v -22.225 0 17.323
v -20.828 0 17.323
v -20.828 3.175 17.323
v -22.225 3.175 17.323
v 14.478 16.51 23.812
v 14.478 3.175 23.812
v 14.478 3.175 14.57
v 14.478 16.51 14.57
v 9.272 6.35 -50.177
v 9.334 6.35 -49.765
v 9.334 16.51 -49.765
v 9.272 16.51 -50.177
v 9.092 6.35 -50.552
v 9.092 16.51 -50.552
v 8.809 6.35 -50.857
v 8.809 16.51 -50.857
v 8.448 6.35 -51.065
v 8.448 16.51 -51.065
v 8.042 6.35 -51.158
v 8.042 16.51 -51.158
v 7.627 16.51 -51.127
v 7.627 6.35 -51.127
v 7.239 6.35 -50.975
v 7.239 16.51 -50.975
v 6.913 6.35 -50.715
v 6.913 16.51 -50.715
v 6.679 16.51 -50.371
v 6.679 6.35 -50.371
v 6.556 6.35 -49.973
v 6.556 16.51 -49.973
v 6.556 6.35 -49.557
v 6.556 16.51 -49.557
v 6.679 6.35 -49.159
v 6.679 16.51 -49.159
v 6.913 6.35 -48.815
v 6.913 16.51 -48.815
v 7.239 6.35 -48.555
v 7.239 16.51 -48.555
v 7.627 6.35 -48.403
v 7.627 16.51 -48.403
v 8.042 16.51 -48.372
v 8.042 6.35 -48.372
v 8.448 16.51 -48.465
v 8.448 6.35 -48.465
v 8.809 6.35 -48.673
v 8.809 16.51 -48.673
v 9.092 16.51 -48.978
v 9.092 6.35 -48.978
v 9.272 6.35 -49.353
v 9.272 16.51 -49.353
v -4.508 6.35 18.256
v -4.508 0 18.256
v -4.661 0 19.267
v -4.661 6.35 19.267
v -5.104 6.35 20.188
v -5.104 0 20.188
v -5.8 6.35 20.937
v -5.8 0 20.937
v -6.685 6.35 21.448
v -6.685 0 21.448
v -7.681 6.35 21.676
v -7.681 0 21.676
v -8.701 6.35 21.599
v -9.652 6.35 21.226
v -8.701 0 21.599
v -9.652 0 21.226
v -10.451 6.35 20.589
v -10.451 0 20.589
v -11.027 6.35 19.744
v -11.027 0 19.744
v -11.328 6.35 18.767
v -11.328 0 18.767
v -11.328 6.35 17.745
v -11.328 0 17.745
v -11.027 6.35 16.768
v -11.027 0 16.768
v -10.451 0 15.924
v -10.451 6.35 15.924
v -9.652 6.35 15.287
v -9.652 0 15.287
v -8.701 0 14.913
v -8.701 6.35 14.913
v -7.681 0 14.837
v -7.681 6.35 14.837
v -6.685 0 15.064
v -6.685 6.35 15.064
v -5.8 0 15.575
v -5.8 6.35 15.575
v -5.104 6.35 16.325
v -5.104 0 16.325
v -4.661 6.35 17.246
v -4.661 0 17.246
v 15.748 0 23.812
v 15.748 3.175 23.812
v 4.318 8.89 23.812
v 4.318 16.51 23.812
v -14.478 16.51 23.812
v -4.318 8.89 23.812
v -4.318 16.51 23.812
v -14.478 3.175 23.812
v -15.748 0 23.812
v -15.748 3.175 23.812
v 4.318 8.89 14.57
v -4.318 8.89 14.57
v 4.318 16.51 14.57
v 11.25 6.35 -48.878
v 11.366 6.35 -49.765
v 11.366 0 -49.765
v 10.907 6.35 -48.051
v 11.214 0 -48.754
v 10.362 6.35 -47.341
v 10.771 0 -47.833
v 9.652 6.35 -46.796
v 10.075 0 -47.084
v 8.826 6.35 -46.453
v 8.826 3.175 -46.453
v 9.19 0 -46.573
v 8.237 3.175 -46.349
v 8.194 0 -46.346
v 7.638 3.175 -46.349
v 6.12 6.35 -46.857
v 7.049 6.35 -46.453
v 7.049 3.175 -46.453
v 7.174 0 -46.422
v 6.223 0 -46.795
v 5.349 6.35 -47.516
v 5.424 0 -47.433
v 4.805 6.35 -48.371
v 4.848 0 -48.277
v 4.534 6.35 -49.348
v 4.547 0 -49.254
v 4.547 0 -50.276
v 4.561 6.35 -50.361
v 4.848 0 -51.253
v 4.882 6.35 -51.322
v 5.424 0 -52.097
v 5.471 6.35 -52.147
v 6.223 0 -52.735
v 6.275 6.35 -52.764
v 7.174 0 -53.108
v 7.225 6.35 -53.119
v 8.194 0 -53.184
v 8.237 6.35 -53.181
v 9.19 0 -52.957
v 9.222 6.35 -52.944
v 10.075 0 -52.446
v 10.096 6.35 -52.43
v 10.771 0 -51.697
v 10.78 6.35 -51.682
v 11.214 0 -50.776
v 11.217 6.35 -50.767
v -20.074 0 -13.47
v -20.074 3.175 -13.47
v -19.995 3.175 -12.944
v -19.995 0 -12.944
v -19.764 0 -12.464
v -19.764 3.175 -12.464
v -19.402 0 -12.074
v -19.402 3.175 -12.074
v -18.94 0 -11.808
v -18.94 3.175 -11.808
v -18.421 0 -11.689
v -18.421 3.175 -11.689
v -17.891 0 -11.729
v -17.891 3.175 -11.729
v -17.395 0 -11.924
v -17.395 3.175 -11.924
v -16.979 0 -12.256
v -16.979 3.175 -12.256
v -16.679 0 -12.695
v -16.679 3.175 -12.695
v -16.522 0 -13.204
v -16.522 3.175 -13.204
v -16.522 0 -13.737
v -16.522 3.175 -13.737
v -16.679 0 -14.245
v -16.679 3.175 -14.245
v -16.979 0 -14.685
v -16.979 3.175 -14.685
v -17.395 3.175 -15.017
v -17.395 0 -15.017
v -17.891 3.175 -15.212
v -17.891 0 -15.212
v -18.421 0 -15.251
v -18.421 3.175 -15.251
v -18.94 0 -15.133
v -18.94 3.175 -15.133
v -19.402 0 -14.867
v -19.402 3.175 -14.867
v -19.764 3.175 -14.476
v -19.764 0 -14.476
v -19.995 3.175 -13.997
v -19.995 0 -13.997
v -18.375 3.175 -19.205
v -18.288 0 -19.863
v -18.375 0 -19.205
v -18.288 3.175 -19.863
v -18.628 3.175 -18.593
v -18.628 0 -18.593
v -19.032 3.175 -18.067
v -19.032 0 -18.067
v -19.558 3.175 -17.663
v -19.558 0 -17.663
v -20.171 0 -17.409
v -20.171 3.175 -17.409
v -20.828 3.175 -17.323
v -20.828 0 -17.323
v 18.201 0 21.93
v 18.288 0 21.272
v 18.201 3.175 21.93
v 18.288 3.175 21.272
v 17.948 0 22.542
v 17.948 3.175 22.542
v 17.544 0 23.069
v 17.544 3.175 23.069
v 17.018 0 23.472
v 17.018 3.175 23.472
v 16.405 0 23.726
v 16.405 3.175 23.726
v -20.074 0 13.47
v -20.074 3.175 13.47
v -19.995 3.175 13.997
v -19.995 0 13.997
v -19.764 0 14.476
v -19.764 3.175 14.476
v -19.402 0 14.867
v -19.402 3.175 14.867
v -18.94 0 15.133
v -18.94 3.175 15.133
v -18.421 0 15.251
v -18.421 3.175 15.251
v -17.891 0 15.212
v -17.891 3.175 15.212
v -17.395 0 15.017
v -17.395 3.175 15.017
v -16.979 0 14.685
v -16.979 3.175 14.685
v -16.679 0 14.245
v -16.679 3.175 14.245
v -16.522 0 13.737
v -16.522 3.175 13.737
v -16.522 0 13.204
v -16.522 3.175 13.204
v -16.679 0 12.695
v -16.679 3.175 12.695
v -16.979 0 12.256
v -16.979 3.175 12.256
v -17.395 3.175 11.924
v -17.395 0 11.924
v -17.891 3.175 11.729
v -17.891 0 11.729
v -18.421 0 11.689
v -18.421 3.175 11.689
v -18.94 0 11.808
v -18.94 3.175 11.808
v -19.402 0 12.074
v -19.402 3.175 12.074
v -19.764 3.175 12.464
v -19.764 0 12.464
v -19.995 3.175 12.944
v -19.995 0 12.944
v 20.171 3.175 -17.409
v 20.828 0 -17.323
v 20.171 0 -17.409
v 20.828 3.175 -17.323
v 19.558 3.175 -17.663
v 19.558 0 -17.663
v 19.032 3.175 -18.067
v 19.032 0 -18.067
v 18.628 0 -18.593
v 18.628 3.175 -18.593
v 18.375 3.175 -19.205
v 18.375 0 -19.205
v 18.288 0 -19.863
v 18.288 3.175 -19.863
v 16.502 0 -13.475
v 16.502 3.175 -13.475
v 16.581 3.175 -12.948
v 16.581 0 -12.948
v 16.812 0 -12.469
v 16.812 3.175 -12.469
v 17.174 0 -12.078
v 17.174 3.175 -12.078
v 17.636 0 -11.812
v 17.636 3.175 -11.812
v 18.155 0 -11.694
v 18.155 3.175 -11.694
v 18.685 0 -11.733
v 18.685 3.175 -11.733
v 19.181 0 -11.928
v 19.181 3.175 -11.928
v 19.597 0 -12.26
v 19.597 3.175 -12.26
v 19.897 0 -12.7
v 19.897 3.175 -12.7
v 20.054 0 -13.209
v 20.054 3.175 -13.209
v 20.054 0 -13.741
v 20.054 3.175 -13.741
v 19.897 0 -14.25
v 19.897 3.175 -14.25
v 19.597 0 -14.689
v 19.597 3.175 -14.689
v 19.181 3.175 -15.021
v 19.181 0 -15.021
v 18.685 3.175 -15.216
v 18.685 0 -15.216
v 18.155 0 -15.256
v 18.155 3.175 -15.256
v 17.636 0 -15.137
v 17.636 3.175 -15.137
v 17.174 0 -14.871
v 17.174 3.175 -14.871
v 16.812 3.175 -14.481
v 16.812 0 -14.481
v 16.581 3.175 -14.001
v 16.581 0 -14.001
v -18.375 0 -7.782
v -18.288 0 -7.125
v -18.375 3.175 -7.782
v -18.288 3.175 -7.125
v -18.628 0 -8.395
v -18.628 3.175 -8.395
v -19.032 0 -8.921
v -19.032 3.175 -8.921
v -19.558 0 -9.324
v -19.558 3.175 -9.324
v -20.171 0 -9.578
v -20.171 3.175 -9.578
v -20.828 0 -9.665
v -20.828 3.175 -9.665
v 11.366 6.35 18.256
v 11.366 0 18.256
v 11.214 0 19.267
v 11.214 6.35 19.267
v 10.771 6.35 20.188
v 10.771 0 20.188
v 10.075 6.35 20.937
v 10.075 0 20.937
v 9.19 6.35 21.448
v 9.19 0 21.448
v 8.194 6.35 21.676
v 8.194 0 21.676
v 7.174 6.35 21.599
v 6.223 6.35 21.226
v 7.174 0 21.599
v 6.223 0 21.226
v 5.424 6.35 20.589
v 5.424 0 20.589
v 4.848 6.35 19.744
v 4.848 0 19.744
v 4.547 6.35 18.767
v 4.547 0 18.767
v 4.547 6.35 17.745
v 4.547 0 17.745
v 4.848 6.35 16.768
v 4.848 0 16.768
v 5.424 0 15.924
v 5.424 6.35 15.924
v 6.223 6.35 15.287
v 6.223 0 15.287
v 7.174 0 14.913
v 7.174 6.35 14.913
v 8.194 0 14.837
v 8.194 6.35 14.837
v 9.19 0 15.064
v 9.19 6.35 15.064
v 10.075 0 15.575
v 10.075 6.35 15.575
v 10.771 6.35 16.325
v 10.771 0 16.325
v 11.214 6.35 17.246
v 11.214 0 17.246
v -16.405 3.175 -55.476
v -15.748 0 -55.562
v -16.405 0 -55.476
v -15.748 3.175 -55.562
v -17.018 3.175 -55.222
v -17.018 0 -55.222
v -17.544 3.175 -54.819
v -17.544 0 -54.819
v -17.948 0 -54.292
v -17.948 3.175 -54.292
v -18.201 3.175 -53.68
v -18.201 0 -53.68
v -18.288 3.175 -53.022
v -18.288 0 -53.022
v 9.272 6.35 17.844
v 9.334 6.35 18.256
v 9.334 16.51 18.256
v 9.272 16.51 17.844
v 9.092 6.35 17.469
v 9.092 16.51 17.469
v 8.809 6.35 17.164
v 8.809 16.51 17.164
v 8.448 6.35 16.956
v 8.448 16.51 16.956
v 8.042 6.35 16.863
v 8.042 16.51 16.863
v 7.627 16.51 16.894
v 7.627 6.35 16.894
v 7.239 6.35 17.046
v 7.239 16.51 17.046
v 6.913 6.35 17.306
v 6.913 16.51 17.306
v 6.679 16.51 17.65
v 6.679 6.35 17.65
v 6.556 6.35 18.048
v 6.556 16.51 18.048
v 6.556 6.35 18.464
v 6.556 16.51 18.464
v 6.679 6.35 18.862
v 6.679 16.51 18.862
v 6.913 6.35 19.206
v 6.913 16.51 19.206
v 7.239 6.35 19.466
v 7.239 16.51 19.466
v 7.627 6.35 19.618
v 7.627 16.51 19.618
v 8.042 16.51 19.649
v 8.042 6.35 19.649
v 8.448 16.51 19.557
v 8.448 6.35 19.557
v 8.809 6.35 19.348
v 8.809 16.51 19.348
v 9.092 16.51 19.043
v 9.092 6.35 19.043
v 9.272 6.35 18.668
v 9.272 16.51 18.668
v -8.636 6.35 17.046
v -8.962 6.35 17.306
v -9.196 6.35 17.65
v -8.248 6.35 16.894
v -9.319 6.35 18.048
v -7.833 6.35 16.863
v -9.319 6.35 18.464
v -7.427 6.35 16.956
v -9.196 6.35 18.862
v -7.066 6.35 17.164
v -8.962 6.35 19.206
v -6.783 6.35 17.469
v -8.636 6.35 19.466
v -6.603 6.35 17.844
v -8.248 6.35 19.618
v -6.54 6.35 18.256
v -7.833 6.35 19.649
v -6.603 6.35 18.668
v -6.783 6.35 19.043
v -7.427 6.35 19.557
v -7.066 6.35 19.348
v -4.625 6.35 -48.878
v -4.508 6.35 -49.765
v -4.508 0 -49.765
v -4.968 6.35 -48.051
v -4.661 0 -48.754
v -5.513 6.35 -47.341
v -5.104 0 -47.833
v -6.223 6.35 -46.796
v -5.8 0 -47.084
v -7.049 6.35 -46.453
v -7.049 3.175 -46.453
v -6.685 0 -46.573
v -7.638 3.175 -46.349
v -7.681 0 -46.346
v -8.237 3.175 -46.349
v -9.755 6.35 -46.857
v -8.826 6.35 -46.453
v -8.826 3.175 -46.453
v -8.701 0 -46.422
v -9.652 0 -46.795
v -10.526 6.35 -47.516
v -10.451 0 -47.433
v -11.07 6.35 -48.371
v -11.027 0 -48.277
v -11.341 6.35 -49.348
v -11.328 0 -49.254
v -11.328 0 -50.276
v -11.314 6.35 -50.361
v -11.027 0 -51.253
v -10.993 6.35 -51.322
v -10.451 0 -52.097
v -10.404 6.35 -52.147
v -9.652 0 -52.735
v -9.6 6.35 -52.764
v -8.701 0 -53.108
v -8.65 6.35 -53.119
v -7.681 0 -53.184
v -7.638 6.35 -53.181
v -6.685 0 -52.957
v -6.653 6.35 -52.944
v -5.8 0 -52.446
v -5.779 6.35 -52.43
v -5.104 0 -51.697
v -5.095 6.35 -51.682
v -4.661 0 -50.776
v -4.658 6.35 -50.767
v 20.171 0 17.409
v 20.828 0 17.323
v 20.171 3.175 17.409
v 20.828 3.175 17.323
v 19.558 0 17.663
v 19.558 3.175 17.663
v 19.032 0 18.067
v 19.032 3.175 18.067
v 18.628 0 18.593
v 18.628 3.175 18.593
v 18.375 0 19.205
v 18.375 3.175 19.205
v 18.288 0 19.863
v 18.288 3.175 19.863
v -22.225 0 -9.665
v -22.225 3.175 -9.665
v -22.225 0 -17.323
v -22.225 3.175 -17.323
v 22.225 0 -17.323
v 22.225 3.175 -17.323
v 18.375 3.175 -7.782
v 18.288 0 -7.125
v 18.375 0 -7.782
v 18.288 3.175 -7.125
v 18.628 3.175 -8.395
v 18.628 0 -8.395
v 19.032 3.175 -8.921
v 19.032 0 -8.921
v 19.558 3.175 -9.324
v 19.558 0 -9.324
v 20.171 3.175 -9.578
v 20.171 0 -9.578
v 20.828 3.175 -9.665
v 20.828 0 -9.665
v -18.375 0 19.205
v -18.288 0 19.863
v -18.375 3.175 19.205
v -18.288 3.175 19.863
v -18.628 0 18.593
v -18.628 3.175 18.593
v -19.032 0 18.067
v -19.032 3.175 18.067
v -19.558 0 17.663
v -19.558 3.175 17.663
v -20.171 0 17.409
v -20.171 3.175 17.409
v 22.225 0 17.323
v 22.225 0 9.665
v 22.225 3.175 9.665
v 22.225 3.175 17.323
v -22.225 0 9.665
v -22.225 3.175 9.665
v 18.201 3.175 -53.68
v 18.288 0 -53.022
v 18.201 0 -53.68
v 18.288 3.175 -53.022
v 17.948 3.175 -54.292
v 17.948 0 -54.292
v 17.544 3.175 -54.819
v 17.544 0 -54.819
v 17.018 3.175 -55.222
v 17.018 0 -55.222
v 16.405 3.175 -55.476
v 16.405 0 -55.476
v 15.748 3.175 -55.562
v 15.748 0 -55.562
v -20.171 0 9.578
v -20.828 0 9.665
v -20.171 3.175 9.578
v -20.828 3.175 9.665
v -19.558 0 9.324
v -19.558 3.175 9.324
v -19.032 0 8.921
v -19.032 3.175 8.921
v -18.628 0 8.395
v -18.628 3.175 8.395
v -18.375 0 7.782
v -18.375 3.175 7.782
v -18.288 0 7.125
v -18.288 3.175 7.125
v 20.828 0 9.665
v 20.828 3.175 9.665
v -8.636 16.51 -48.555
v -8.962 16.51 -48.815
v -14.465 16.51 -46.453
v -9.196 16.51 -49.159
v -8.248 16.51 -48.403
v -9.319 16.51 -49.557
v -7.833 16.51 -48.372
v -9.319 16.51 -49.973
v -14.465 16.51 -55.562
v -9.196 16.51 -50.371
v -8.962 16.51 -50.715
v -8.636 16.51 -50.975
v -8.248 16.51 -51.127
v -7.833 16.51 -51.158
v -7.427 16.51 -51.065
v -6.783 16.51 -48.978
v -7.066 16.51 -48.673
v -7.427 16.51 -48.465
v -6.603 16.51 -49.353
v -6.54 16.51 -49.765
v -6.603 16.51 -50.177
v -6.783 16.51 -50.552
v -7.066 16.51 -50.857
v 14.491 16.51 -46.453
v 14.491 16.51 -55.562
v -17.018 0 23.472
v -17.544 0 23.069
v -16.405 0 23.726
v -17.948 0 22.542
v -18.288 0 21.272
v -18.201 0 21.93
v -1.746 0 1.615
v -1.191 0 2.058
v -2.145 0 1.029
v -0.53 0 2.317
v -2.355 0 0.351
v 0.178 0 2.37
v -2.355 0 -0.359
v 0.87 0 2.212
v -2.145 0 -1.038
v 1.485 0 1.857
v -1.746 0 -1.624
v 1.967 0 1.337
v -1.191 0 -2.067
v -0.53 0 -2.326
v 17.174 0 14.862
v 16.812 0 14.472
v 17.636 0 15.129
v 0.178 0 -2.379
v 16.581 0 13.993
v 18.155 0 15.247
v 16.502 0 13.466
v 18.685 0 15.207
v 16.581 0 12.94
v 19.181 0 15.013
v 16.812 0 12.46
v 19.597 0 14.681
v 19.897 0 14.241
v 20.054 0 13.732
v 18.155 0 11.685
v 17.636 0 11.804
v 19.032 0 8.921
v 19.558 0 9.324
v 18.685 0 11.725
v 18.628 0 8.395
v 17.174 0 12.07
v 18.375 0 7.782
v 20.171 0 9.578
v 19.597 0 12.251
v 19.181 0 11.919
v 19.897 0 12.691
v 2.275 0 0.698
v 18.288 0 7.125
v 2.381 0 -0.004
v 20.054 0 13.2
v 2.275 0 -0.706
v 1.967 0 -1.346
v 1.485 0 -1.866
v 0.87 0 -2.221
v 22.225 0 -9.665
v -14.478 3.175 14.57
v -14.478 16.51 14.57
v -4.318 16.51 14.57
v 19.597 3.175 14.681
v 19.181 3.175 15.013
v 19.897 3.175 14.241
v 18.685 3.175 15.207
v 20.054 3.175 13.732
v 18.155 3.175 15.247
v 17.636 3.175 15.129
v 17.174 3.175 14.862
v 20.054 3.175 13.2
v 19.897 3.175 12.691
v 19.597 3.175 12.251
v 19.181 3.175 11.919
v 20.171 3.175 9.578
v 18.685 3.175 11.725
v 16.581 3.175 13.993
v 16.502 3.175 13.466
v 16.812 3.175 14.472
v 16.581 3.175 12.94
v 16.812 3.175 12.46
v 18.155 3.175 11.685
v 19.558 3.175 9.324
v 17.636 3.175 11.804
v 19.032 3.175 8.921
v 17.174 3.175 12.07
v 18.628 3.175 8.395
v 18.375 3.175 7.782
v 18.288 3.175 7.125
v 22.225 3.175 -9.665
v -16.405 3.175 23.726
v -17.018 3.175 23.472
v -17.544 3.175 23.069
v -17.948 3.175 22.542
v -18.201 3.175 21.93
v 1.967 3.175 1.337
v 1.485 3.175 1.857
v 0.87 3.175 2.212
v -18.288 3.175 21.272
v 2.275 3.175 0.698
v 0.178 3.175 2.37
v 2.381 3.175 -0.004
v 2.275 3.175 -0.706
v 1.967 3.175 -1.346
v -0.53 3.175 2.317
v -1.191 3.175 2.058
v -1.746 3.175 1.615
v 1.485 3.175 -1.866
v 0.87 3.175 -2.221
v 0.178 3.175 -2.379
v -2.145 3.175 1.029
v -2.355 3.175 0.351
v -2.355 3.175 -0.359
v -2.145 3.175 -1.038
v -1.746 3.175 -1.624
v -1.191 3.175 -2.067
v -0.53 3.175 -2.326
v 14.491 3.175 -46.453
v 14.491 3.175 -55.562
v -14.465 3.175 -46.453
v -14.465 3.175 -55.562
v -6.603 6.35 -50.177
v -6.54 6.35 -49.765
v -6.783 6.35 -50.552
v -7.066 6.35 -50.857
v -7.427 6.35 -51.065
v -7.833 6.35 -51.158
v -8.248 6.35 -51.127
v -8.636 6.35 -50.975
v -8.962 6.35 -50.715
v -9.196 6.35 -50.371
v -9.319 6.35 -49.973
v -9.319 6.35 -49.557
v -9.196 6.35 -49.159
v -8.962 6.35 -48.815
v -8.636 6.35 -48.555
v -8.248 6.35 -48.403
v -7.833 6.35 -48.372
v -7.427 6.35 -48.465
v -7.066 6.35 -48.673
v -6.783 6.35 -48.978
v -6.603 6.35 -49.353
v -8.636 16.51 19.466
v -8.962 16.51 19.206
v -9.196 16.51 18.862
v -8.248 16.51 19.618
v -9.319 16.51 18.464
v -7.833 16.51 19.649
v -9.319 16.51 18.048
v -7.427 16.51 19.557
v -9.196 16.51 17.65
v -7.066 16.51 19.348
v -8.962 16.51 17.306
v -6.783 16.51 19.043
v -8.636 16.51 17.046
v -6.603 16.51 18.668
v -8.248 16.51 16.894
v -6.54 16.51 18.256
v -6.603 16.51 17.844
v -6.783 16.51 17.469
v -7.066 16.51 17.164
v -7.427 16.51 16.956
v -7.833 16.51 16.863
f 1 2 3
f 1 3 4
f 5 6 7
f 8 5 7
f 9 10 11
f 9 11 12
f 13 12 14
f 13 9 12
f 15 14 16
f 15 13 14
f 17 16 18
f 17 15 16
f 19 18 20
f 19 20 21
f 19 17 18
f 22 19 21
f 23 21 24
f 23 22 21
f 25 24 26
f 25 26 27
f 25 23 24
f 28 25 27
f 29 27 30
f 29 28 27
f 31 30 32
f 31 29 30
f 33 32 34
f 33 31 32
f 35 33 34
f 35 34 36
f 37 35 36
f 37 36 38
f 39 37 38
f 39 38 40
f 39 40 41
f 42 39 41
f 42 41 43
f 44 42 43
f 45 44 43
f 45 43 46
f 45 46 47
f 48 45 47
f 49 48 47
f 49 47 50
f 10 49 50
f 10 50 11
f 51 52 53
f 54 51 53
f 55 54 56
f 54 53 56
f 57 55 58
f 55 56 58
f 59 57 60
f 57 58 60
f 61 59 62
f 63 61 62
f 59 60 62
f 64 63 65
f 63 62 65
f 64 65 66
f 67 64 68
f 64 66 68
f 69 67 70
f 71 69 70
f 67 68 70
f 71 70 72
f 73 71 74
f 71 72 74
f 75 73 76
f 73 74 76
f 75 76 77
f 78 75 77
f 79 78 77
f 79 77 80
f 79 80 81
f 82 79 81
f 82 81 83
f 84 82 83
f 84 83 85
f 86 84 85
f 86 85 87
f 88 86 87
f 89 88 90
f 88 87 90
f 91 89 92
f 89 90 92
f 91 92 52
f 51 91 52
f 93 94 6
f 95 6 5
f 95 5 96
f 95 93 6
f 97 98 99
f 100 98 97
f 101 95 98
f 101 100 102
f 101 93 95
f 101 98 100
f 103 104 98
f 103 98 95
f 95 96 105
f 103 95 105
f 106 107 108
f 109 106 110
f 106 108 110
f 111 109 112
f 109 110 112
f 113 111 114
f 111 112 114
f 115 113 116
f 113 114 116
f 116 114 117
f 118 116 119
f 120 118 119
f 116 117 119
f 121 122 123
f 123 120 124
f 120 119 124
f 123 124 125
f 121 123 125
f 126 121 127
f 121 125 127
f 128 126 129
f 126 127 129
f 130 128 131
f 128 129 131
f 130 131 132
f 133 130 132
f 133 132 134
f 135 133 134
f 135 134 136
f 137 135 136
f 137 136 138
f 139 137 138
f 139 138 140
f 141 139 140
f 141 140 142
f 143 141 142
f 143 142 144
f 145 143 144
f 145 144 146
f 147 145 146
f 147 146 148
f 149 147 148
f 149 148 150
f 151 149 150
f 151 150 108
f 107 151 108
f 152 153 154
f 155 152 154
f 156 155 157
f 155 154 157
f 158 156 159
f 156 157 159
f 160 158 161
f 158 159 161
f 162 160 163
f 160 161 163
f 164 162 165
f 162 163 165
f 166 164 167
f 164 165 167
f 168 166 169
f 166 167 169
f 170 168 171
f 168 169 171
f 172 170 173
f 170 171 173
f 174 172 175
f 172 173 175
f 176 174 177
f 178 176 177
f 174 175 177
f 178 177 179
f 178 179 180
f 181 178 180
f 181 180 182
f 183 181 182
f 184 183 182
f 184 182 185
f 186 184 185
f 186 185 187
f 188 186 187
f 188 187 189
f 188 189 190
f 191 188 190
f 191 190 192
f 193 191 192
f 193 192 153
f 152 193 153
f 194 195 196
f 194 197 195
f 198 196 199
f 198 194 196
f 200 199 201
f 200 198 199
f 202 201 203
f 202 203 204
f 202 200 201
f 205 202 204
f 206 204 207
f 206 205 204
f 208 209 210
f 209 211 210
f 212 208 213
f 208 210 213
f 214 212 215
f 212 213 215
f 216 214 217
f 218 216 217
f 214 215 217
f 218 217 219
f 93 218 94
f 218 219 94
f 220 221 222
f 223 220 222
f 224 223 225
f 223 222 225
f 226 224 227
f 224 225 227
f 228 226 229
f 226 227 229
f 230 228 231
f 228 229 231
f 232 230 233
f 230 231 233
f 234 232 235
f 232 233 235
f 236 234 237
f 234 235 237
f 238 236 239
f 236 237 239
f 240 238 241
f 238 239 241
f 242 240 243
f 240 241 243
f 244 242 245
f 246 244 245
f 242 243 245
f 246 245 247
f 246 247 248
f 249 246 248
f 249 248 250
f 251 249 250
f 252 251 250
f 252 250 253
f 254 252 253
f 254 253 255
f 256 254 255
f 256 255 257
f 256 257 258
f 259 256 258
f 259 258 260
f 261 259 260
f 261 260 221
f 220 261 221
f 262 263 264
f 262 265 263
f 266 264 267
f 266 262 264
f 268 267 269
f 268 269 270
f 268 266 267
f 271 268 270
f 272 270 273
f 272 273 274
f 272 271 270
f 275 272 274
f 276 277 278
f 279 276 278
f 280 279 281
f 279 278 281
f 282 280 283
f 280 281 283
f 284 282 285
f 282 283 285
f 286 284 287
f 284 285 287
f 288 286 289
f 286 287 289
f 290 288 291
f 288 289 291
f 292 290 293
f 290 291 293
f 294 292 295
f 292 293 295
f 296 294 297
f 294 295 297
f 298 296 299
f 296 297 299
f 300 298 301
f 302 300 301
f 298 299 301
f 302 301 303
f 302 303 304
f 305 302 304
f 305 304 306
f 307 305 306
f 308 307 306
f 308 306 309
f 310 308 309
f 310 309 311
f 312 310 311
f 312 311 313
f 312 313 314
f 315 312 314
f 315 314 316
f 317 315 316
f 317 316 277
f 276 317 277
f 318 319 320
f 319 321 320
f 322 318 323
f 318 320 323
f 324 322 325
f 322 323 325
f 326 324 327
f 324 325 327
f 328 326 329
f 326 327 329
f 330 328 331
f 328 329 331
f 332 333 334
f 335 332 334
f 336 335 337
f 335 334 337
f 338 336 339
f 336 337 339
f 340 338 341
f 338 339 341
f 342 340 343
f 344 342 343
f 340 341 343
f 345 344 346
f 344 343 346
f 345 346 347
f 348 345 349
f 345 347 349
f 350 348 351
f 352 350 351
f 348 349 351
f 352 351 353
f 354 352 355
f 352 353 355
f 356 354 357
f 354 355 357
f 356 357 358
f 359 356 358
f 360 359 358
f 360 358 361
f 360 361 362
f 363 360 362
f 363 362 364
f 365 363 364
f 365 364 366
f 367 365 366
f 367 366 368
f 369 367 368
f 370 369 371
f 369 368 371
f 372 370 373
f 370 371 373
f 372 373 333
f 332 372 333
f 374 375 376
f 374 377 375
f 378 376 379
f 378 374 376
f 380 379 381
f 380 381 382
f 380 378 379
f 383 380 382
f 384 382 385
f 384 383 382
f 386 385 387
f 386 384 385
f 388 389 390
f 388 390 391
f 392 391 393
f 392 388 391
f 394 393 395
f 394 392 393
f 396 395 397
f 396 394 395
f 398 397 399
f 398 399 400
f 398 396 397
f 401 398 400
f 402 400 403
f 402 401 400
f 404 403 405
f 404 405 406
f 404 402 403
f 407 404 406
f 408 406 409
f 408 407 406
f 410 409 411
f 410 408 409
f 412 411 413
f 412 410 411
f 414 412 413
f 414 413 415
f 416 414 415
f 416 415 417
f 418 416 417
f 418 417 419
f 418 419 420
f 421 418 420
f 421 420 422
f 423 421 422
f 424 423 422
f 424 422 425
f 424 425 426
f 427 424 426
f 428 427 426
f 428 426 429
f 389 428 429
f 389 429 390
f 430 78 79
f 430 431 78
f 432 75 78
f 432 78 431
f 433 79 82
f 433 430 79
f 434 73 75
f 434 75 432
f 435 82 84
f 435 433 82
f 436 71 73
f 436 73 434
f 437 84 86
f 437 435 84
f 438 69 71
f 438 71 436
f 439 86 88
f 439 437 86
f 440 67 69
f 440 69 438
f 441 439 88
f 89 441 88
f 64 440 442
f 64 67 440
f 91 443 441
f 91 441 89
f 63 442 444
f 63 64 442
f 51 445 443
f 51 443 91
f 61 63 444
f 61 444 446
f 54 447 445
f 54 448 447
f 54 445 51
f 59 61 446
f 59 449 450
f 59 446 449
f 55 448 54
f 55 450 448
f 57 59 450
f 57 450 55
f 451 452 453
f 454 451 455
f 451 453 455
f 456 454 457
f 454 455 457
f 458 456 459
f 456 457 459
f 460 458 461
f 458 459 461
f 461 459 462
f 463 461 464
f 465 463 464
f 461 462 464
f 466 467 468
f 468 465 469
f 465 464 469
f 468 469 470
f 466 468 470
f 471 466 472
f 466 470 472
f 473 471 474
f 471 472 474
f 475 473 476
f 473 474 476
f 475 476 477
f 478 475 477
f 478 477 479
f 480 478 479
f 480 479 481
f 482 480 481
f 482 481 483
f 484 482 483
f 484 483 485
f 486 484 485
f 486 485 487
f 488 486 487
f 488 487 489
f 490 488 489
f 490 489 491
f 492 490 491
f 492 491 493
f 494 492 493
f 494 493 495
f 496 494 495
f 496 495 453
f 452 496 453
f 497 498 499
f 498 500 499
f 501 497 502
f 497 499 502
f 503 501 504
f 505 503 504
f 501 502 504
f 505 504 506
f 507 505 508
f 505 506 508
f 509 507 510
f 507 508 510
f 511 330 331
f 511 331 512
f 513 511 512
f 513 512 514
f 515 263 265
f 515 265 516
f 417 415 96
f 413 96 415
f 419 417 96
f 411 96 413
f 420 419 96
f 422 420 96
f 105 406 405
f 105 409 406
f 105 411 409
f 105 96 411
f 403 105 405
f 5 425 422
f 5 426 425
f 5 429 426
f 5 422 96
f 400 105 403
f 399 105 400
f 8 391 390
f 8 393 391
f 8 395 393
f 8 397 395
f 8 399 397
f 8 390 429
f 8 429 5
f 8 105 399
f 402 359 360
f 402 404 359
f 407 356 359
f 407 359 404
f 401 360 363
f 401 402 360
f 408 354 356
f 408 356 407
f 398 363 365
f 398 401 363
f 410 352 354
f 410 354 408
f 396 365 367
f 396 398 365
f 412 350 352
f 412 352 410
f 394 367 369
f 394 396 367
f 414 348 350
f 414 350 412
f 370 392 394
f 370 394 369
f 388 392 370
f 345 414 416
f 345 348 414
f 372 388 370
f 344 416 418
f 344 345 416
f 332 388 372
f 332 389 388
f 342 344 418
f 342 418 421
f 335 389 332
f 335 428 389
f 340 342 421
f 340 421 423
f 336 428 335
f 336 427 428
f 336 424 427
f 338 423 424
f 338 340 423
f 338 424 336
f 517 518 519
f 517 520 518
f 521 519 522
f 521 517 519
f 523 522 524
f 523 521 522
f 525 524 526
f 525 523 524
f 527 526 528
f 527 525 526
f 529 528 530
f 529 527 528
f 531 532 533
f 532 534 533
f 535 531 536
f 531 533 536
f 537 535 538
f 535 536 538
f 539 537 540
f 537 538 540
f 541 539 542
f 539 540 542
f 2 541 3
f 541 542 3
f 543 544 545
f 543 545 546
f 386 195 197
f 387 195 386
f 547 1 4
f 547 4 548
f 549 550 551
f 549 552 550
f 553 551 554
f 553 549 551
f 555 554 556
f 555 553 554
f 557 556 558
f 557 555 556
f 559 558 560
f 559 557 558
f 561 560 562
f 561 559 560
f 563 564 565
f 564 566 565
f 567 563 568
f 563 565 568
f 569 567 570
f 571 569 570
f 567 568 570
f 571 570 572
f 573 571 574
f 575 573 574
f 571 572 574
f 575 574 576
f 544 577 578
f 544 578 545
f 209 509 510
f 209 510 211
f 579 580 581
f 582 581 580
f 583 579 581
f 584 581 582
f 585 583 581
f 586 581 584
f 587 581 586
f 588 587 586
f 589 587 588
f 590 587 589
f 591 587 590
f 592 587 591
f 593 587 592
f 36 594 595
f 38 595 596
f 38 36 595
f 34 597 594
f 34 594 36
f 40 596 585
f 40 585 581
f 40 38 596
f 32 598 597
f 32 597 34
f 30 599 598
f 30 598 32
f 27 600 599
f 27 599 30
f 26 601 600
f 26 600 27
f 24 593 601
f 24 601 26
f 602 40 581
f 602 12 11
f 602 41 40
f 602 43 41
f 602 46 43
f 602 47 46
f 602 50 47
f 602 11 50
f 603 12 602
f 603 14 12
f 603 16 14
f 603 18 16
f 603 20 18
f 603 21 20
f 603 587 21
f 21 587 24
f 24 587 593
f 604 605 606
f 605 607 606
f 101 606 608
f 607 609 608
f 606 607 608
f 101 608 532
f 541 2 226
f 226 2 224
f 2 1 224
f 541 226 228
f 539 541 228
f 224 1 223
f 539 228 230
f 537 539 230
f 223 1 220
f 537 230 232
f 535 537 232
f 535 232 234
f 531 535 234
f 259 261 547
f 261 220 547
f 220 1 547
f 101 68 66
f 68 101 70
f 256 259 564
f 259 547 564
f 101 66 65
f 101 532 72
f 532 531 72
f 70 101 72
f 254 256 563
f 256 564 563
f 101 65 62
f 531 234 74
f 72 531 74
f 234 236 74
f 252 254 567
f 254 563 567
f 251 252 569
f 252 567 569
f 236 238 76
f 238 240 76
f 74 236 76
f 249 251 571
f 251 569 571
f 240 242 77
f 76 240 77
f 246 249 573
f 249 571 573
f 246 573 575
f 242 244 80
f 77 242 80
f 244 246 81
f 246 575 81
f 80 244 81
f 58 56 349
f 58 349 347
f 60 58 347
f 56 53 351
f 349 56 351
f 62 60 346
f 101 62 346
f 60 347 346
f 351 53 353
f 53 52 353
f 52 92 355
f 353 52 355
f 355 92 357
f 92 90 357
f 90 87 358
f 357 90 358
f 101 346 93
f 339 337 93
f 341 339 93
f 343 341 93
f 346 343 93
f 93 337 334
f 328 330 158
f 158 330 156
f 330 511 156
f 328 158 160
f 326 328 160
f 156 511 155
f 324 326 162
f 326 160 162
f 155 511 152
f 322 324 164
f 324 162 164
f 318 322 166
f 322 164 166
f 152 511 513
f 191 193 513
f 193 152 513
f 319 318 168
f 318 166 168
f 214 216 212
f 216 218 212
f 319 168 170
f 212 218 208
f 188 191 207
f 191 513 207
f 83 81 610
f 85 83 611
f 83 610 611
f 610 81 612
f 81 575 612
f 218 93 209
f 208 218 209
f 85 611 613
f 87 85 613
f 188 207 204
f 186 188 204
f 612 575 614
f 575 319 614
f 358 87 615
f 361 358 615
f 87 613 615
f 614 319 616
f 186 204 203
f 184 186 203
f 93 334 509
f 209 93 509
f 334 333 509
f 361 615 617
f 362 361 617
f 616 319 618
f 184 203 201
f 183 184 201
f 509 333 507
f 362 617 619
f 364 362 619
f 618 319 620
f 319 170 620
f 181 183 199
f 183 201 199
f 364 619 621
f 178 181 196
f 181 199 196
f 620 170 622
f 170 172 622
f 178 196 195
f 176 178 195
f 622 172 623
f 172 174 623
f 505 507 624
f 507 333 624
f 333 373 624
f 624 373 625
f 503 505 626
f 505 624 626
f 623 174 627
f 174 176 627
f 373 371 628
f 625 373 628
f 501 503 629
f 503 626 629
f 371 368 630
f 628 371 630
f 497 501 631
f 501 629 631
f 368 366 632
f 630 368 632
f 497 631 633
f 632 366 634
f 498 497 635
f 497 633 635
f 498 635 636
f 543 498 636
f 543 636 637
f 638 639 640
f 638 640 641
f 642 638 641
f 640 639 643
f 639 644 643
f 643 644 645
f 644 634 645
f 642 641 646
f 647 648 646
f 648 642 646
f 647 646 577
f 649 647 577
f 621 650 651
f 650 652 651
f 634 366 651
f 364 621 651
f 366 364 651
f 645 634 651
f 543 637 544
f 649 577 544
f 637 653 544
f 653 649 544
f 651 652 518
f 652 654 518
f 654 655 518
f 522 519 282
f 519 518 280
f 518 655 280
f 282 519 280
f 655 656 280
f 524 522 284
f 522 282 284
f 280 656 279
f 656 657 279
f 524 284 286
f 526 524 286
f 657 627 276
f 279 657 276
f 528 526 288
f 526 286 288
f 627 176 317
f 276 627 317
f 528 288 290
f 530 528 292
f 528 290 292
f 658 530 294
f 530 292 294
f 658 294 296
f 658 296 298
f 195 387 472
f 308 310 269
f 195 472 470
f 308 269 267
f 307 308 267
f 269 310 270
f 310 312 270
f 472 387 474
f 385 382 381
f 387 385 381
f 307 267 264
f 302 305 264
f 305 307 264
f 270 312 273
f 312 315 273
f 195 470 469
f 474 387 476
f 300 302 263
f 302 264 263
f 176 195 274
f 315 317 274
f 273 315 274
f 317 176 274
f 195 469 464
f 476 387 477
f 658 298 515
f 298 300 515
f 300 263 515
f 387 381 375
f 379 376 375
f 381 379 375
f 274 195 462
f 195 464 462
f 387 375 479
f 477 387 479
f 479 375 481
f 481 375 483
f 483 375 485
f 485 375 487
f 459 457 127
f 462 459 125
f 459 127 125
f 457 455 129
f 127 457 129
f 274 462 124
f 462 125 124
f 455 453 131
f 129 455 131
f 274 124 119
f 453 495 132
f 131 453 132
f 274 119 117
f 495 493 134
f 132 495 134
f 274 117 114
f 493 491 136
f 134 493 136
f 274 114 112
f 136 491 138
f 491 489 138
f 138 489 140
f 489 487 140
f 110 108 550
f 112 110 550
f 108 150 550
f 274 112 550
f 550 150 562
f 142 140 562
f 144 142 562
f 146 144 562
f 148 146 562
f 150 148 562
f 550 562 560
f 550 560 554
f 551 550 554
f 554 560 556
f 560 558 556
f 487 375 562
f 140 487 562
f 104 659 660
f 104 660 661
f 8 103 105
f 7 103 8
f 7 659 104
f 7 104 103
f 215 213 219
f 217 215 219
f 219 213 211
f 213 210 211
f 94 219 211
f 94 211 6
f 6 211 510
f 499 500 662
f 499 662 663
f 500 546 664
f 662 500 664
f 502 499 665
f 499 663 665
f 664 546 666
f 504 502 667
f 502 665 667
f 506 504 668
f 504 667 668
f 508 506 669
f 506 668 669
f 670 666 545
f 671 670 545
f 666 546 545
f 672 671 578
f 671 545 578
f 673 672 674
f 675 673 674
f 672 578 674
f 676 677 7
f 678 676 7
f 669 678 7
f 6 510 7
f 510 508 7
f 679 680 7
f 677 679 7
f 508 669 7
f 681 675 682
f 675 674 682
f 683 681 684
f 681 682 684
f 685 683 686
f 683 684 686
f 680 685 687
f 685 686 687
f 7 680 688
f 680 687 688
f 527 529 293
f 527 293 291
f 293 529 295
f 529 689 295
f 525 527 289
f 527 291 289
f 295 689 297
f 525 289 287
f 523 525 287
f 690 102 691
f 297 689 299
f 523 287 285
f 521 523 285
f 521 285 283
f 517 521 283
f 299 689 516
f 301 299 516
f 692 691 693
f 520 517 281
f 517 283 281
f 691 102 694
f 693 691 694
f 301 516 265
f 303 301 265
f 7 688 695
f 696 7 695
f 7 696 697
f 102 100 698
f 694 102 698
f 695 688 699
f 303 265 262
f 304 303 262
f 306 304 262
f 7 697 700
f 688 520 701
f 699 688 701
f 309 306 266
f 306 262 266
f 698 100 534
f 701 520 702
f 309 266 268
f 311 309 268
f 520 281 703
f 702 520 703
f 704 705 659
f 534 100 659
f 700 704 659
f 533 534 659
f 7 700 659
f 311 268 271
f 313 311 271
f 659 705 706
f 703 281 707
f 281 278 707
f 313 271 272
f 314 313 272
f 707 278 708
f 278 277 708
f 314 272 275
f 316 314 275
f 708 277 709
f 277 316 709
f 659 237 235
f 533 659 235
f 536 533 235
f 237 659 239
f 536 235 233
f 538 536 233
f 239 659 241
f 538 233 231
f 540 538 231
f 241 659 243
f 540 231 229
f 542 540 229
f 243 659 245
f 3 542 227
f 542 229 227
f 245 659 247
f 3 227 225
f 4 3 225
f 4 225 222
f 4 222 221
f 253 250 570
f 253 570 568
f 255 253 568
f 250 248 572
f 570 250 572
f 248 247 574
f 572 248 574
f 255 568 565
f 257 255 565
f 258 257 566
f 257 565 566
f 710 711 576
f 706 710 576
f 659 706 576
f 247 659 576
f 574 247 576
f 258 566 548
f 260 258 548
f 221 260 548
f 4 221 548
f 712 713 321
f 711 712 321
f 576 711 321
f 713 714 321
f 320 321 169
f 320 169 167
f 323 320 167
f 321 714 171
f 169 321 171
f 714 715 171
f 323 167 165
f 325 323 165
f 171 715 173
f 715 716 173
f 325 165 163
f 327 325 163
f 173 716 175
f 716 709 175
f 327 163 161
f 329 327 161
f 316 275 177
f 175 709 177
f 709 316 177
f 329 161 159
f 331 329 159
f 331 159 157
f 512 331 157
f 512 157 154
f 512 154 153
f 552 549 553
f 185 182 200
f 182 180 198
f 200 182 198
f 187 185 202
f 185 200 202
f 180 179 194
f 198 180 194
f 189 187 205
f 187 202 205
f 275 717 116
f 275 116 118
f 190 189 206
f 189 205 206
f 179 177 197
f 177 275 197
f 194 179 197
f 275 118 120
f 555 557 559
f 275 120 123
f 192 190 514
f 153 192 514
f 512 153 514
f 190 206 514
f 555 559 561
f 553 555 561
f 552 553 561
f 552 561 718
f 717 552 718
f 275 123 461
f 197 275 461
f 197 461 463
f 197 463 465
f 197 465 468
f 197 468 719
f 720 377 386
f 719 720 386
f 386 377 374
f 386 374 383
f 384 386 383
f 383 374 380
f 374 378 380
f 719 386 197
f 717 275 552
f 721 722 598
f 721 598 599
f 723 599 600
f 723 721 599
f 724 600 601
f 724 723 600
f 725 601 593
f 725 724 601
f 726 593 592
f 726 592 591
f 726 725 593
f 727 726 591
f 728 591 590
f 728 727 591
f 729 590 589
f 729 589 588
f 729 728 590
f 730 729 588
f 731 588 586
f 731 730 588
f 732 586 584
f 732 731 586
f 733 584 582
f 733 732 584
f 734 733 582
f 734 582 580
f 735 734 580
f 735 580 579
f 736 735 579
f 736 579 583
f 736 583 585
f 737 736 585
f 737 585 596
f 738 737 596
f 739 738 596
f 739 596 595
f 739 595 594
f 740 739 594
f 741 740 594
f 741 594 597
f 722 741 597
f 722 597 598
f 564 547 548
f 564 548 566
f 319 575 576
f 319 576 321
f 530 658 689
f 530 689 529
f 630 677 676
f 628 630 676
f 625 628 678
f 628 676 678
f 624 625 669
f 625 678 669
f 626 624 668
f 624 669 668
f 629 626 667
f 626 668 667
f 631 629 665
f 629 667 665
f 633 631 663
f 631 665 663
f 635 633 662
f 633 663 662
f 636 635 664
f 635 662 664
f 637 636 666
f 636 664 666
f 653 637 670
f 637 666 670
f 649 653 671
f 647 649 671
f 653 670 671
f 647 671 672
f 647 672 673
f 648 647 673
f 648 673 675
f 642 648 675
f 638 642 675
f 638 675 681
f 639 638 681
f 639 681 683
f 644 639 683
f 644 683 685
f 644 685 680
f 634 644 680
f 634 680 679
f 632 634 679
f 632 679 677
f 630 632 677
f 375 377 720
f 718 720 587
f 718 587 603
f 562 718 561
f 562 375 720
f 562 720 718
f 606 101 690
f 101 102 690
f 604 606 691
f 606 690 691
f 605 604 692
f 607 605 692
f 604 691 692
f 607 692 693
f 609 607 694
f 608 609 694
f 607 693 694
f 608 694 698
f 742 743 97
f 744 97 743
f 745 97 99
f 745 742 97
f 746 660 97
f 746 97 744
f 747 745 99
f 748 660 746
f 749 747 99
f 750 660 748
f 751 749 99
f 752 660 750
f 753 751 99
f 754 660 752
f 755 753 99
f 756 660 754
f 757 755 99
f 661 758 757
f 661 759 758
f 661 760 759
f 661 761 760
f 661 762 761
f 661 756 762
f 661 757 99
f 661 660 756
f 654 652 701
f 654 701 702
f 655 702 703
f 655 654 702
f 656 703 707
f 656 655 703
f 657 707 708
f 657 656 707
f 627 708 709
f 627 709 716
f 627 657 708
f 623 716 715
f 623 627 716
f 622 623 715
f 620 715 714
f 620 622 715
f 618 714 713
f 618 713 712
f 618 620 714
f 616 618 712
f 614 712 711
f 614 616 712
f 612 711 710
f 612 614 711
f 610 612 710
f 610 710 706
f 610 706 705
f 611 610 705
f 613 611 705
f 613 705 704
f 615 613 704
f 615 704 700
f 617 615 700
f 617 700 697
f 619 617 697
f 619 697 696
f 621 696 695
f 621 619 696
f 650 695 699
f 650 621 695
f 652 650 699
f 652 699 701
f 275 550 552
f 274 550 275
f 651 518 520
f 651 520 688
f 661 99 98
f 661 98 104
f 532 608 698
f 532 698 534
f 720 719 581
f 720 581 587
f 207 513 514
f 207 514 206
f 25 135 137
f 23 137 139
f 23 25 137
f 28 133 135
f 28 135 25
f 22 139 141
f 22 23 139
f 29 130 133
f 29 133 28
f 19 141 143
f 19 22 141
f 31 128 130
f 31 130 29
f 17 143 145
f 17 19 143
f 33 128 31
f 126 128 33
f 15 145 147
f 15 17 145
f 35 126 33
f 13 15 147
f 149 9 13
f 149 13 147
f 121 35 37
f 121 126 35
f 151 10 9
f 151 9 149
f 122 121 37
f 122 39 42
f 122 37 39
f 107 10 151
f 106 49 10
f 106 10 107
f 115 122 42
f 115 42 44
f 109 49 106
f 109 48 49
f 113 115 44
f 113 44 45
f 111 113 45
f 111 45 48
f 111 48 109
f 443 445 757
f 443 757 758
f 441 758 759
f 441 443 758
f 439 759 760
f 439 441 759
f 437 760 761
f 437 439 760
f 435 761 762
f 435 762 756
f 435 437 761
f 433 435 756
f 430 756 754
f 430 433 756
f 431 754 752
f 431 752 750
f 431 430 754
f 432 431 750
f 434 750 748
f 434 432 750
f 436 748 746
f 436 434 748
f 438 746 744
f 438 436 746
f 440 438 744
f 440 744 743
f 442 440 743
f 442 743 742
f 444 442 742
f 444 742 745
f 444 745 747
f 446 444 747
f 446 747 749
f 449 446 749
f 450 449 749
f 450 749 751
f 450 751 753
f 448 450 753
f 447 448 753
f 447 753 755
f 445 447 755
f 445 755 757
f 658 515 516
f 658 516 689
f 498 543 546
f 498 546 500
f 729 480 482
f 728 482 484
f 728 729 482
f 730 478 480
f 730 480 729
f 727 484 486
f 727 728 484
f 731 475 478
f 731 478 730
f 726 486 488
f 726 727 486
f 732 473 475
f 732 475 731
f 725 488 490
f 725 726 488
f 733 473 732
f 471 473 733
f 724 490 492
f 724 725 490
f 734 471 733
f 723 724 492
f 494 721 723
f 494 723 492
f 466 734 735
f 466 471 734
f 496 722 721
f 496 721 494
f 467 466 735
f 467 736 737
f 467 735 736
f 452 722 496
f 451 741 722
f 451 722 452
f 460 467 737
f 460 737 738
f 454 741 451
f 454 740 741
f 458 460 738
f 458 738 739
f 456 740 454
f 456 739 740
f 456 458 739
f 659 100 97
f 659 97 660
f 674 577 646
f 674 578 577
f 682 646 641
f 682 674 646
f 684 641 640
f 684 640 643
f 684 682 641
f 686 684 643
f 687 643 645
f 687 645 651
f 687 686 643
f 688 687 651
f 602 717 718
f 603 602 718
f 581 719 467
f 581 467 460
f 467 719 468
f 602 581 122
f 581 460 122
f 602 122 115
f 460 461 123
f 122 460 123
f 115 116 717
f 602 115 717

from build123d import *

# Parameters (mm, degrees)
SKETCH1_R                           = 2.38125
BOSS_EXTRUDE1_DEPTH                 = 3.175
F_9_64_0_14063_DIAMETER_HOLE1_D     = 3.572002
F_9_64_0_14063_DIAMETER_HOLE1_DEPTH = 3.175
FILLET1_R                           = 2.54
SKETCH9_W                           = 28.956
SKETCH9_H                           = 9.242923456
SKETCH9_R                           = 1.397
SKETCH9_H_2                         = 9.1095327
BOSS_EXTRUDE3_DEPTH                 = 16.51
SKETCH10_R                          = 3.429
CUT_EXTRUDE1_DEPTH                  = 6.35
SKETCH11_W                          = 8.636
SKETCH11_H                          = 9.242923456
CUT_EXTRUDE2_DEPTH                  = 7.62


with BuildPart() as part:
    # Sketch1 → Boss-Extrude1 (new body)
    with BuildSketch(Plane(origin=(0, 0, 0), x_dir=(1, 0, 0), z_dir=(0, 1, 0))):
        Polygon((18.288, -9.6647), (22.225, -9.6647), (22.225, -17.3228), (18.288, -17.3228), (18.288, -23.8125), (-18.288, -23.8125), (-18.288, -17.3228), (-22.225, -17.3228), (-22.225, -9.6647), (-18.288, -9.6647), (-18.288, 9.6647), (-22.225, 9.6647), (-22.225, 17.3228), (-18.288, 17.3228), (-18.288, 55.5625), (18.288, 55.5625), (18.288, 17.3228), (22.225, 17.3228), (22.225, 9.6647), (18.288, 9.6647), align=None)
        with Locations((0, 0.004315819)):
            Circle(SKETCH1_R, mode=Mode.SUBTRACT)
    extrude(amount=BOSS_EXTRUDE1_DEPTH)

    # 9/64 (0.14063) Diameter Hole1
    with Locations(Plane.XZ):
        with Locations((18.287999999, -13.474700001), (18.288, 13.466068362), (-18.288, -13.470384182), (-18.288, 13.470384182)):
            Hole(F_9_64_0_14063_DIAMETER_HOLE1_D / 2, depth=F_9_64_0_14063_DIAMETER_HOLE1_DEPTH)

    # Fillet1
    fillet1_edges = [part.edges().sort_by_distance(p)[0] for p in [
        (18.288, 1.5875, 23.8125),
        (-18.288, 1.5875, 23.8125),
        (-18.288, 1.5875, 17.3228),
        (-18.288, 1.5875, 9.6647),
        (-18.288, 1.5875, -9.6647),
        (-18.288, 1.5875, -17.3228),
        (-18.288, 1.5875, -55.5625),
        (18.288, 1.5875, -55.5625),
        (18.288, 1.5875, -17.3228),
        (18.288, 1.5875, -9.6647),
        (18.288, 1.5875, 9.6647),
        (18.288, 1.5875, 17.3228),
    ]]
    fillet(fillet1_edges, radius=FILLET1_R)

    # Sketch9 → Boss-Extrude3 (add)
    with BuildSketch(Plane(origin=(0, 0, 0), x_dir=(1, 0, 0), z_dir=(0, 1, 0))):
        with Locations((0, -19.191038272)):
            Rectangle(SKETCH9_W, SKETCH9_H)
        with Locations((-7.9375, -18.25625)):
            Circle(SKETCH9_R, mode=Mode.SUBTRACT)
        with Locations((7.9375, -18.25625)):
            Circle(SKETCH9_R, mode=Mode.SUBTRACT)
        with Locations((0.012736117, 51.00773365)):
            Rectangle(SKETCH9_W, SKETCH9_H_2)
        with Locations((-7.9375, 49.76495)):
            Circle(SKETCH9_R, mode=Mode.SUBTRACT)
        with Locations((7.9375, 49.76495)):
            Circle(SKETCH9_R, mode=Mode.SUBTRACT)
    extrude(amount=BOSS_EXTRUDE3_DEPTH)

    # Sketch10 → Cut-Extrude1 (cut)
    with BuildSketch(Plane.XZ):
        with Locations((7.9375, 18.25625)):
            Circle(SKETCH10_R)
        with Locations((-7.9375, 18.25625)):
            Circle(SKETCH10_R)
        with Locations((7.9375, -49.76495)):
            Circle(SKETCH10_R)
        with Locations((-7.9375, -49.76495)):
            Circle(SKETCH10_R)
    extrude(amount=-CUT_EXTRUDE1_DEPTH, mode=Mode.SUBTRACT)

    # Sketch11 → Cut-Extrude2 (cut)
    with BuildSketch(Plane(origin=(0, 16.51, 0), x_dir=(1, 0, 0), z_dir=(0, 1, 0))):
        with Locations((0, -19.191038272)):
            Rectangle(SKETCH11_W, SKETCH11_H)
    extrude(amount=-CUT_EXTRUDE2_DEPTH, mode=Mode.SUBTRACT)


solid = part.part
